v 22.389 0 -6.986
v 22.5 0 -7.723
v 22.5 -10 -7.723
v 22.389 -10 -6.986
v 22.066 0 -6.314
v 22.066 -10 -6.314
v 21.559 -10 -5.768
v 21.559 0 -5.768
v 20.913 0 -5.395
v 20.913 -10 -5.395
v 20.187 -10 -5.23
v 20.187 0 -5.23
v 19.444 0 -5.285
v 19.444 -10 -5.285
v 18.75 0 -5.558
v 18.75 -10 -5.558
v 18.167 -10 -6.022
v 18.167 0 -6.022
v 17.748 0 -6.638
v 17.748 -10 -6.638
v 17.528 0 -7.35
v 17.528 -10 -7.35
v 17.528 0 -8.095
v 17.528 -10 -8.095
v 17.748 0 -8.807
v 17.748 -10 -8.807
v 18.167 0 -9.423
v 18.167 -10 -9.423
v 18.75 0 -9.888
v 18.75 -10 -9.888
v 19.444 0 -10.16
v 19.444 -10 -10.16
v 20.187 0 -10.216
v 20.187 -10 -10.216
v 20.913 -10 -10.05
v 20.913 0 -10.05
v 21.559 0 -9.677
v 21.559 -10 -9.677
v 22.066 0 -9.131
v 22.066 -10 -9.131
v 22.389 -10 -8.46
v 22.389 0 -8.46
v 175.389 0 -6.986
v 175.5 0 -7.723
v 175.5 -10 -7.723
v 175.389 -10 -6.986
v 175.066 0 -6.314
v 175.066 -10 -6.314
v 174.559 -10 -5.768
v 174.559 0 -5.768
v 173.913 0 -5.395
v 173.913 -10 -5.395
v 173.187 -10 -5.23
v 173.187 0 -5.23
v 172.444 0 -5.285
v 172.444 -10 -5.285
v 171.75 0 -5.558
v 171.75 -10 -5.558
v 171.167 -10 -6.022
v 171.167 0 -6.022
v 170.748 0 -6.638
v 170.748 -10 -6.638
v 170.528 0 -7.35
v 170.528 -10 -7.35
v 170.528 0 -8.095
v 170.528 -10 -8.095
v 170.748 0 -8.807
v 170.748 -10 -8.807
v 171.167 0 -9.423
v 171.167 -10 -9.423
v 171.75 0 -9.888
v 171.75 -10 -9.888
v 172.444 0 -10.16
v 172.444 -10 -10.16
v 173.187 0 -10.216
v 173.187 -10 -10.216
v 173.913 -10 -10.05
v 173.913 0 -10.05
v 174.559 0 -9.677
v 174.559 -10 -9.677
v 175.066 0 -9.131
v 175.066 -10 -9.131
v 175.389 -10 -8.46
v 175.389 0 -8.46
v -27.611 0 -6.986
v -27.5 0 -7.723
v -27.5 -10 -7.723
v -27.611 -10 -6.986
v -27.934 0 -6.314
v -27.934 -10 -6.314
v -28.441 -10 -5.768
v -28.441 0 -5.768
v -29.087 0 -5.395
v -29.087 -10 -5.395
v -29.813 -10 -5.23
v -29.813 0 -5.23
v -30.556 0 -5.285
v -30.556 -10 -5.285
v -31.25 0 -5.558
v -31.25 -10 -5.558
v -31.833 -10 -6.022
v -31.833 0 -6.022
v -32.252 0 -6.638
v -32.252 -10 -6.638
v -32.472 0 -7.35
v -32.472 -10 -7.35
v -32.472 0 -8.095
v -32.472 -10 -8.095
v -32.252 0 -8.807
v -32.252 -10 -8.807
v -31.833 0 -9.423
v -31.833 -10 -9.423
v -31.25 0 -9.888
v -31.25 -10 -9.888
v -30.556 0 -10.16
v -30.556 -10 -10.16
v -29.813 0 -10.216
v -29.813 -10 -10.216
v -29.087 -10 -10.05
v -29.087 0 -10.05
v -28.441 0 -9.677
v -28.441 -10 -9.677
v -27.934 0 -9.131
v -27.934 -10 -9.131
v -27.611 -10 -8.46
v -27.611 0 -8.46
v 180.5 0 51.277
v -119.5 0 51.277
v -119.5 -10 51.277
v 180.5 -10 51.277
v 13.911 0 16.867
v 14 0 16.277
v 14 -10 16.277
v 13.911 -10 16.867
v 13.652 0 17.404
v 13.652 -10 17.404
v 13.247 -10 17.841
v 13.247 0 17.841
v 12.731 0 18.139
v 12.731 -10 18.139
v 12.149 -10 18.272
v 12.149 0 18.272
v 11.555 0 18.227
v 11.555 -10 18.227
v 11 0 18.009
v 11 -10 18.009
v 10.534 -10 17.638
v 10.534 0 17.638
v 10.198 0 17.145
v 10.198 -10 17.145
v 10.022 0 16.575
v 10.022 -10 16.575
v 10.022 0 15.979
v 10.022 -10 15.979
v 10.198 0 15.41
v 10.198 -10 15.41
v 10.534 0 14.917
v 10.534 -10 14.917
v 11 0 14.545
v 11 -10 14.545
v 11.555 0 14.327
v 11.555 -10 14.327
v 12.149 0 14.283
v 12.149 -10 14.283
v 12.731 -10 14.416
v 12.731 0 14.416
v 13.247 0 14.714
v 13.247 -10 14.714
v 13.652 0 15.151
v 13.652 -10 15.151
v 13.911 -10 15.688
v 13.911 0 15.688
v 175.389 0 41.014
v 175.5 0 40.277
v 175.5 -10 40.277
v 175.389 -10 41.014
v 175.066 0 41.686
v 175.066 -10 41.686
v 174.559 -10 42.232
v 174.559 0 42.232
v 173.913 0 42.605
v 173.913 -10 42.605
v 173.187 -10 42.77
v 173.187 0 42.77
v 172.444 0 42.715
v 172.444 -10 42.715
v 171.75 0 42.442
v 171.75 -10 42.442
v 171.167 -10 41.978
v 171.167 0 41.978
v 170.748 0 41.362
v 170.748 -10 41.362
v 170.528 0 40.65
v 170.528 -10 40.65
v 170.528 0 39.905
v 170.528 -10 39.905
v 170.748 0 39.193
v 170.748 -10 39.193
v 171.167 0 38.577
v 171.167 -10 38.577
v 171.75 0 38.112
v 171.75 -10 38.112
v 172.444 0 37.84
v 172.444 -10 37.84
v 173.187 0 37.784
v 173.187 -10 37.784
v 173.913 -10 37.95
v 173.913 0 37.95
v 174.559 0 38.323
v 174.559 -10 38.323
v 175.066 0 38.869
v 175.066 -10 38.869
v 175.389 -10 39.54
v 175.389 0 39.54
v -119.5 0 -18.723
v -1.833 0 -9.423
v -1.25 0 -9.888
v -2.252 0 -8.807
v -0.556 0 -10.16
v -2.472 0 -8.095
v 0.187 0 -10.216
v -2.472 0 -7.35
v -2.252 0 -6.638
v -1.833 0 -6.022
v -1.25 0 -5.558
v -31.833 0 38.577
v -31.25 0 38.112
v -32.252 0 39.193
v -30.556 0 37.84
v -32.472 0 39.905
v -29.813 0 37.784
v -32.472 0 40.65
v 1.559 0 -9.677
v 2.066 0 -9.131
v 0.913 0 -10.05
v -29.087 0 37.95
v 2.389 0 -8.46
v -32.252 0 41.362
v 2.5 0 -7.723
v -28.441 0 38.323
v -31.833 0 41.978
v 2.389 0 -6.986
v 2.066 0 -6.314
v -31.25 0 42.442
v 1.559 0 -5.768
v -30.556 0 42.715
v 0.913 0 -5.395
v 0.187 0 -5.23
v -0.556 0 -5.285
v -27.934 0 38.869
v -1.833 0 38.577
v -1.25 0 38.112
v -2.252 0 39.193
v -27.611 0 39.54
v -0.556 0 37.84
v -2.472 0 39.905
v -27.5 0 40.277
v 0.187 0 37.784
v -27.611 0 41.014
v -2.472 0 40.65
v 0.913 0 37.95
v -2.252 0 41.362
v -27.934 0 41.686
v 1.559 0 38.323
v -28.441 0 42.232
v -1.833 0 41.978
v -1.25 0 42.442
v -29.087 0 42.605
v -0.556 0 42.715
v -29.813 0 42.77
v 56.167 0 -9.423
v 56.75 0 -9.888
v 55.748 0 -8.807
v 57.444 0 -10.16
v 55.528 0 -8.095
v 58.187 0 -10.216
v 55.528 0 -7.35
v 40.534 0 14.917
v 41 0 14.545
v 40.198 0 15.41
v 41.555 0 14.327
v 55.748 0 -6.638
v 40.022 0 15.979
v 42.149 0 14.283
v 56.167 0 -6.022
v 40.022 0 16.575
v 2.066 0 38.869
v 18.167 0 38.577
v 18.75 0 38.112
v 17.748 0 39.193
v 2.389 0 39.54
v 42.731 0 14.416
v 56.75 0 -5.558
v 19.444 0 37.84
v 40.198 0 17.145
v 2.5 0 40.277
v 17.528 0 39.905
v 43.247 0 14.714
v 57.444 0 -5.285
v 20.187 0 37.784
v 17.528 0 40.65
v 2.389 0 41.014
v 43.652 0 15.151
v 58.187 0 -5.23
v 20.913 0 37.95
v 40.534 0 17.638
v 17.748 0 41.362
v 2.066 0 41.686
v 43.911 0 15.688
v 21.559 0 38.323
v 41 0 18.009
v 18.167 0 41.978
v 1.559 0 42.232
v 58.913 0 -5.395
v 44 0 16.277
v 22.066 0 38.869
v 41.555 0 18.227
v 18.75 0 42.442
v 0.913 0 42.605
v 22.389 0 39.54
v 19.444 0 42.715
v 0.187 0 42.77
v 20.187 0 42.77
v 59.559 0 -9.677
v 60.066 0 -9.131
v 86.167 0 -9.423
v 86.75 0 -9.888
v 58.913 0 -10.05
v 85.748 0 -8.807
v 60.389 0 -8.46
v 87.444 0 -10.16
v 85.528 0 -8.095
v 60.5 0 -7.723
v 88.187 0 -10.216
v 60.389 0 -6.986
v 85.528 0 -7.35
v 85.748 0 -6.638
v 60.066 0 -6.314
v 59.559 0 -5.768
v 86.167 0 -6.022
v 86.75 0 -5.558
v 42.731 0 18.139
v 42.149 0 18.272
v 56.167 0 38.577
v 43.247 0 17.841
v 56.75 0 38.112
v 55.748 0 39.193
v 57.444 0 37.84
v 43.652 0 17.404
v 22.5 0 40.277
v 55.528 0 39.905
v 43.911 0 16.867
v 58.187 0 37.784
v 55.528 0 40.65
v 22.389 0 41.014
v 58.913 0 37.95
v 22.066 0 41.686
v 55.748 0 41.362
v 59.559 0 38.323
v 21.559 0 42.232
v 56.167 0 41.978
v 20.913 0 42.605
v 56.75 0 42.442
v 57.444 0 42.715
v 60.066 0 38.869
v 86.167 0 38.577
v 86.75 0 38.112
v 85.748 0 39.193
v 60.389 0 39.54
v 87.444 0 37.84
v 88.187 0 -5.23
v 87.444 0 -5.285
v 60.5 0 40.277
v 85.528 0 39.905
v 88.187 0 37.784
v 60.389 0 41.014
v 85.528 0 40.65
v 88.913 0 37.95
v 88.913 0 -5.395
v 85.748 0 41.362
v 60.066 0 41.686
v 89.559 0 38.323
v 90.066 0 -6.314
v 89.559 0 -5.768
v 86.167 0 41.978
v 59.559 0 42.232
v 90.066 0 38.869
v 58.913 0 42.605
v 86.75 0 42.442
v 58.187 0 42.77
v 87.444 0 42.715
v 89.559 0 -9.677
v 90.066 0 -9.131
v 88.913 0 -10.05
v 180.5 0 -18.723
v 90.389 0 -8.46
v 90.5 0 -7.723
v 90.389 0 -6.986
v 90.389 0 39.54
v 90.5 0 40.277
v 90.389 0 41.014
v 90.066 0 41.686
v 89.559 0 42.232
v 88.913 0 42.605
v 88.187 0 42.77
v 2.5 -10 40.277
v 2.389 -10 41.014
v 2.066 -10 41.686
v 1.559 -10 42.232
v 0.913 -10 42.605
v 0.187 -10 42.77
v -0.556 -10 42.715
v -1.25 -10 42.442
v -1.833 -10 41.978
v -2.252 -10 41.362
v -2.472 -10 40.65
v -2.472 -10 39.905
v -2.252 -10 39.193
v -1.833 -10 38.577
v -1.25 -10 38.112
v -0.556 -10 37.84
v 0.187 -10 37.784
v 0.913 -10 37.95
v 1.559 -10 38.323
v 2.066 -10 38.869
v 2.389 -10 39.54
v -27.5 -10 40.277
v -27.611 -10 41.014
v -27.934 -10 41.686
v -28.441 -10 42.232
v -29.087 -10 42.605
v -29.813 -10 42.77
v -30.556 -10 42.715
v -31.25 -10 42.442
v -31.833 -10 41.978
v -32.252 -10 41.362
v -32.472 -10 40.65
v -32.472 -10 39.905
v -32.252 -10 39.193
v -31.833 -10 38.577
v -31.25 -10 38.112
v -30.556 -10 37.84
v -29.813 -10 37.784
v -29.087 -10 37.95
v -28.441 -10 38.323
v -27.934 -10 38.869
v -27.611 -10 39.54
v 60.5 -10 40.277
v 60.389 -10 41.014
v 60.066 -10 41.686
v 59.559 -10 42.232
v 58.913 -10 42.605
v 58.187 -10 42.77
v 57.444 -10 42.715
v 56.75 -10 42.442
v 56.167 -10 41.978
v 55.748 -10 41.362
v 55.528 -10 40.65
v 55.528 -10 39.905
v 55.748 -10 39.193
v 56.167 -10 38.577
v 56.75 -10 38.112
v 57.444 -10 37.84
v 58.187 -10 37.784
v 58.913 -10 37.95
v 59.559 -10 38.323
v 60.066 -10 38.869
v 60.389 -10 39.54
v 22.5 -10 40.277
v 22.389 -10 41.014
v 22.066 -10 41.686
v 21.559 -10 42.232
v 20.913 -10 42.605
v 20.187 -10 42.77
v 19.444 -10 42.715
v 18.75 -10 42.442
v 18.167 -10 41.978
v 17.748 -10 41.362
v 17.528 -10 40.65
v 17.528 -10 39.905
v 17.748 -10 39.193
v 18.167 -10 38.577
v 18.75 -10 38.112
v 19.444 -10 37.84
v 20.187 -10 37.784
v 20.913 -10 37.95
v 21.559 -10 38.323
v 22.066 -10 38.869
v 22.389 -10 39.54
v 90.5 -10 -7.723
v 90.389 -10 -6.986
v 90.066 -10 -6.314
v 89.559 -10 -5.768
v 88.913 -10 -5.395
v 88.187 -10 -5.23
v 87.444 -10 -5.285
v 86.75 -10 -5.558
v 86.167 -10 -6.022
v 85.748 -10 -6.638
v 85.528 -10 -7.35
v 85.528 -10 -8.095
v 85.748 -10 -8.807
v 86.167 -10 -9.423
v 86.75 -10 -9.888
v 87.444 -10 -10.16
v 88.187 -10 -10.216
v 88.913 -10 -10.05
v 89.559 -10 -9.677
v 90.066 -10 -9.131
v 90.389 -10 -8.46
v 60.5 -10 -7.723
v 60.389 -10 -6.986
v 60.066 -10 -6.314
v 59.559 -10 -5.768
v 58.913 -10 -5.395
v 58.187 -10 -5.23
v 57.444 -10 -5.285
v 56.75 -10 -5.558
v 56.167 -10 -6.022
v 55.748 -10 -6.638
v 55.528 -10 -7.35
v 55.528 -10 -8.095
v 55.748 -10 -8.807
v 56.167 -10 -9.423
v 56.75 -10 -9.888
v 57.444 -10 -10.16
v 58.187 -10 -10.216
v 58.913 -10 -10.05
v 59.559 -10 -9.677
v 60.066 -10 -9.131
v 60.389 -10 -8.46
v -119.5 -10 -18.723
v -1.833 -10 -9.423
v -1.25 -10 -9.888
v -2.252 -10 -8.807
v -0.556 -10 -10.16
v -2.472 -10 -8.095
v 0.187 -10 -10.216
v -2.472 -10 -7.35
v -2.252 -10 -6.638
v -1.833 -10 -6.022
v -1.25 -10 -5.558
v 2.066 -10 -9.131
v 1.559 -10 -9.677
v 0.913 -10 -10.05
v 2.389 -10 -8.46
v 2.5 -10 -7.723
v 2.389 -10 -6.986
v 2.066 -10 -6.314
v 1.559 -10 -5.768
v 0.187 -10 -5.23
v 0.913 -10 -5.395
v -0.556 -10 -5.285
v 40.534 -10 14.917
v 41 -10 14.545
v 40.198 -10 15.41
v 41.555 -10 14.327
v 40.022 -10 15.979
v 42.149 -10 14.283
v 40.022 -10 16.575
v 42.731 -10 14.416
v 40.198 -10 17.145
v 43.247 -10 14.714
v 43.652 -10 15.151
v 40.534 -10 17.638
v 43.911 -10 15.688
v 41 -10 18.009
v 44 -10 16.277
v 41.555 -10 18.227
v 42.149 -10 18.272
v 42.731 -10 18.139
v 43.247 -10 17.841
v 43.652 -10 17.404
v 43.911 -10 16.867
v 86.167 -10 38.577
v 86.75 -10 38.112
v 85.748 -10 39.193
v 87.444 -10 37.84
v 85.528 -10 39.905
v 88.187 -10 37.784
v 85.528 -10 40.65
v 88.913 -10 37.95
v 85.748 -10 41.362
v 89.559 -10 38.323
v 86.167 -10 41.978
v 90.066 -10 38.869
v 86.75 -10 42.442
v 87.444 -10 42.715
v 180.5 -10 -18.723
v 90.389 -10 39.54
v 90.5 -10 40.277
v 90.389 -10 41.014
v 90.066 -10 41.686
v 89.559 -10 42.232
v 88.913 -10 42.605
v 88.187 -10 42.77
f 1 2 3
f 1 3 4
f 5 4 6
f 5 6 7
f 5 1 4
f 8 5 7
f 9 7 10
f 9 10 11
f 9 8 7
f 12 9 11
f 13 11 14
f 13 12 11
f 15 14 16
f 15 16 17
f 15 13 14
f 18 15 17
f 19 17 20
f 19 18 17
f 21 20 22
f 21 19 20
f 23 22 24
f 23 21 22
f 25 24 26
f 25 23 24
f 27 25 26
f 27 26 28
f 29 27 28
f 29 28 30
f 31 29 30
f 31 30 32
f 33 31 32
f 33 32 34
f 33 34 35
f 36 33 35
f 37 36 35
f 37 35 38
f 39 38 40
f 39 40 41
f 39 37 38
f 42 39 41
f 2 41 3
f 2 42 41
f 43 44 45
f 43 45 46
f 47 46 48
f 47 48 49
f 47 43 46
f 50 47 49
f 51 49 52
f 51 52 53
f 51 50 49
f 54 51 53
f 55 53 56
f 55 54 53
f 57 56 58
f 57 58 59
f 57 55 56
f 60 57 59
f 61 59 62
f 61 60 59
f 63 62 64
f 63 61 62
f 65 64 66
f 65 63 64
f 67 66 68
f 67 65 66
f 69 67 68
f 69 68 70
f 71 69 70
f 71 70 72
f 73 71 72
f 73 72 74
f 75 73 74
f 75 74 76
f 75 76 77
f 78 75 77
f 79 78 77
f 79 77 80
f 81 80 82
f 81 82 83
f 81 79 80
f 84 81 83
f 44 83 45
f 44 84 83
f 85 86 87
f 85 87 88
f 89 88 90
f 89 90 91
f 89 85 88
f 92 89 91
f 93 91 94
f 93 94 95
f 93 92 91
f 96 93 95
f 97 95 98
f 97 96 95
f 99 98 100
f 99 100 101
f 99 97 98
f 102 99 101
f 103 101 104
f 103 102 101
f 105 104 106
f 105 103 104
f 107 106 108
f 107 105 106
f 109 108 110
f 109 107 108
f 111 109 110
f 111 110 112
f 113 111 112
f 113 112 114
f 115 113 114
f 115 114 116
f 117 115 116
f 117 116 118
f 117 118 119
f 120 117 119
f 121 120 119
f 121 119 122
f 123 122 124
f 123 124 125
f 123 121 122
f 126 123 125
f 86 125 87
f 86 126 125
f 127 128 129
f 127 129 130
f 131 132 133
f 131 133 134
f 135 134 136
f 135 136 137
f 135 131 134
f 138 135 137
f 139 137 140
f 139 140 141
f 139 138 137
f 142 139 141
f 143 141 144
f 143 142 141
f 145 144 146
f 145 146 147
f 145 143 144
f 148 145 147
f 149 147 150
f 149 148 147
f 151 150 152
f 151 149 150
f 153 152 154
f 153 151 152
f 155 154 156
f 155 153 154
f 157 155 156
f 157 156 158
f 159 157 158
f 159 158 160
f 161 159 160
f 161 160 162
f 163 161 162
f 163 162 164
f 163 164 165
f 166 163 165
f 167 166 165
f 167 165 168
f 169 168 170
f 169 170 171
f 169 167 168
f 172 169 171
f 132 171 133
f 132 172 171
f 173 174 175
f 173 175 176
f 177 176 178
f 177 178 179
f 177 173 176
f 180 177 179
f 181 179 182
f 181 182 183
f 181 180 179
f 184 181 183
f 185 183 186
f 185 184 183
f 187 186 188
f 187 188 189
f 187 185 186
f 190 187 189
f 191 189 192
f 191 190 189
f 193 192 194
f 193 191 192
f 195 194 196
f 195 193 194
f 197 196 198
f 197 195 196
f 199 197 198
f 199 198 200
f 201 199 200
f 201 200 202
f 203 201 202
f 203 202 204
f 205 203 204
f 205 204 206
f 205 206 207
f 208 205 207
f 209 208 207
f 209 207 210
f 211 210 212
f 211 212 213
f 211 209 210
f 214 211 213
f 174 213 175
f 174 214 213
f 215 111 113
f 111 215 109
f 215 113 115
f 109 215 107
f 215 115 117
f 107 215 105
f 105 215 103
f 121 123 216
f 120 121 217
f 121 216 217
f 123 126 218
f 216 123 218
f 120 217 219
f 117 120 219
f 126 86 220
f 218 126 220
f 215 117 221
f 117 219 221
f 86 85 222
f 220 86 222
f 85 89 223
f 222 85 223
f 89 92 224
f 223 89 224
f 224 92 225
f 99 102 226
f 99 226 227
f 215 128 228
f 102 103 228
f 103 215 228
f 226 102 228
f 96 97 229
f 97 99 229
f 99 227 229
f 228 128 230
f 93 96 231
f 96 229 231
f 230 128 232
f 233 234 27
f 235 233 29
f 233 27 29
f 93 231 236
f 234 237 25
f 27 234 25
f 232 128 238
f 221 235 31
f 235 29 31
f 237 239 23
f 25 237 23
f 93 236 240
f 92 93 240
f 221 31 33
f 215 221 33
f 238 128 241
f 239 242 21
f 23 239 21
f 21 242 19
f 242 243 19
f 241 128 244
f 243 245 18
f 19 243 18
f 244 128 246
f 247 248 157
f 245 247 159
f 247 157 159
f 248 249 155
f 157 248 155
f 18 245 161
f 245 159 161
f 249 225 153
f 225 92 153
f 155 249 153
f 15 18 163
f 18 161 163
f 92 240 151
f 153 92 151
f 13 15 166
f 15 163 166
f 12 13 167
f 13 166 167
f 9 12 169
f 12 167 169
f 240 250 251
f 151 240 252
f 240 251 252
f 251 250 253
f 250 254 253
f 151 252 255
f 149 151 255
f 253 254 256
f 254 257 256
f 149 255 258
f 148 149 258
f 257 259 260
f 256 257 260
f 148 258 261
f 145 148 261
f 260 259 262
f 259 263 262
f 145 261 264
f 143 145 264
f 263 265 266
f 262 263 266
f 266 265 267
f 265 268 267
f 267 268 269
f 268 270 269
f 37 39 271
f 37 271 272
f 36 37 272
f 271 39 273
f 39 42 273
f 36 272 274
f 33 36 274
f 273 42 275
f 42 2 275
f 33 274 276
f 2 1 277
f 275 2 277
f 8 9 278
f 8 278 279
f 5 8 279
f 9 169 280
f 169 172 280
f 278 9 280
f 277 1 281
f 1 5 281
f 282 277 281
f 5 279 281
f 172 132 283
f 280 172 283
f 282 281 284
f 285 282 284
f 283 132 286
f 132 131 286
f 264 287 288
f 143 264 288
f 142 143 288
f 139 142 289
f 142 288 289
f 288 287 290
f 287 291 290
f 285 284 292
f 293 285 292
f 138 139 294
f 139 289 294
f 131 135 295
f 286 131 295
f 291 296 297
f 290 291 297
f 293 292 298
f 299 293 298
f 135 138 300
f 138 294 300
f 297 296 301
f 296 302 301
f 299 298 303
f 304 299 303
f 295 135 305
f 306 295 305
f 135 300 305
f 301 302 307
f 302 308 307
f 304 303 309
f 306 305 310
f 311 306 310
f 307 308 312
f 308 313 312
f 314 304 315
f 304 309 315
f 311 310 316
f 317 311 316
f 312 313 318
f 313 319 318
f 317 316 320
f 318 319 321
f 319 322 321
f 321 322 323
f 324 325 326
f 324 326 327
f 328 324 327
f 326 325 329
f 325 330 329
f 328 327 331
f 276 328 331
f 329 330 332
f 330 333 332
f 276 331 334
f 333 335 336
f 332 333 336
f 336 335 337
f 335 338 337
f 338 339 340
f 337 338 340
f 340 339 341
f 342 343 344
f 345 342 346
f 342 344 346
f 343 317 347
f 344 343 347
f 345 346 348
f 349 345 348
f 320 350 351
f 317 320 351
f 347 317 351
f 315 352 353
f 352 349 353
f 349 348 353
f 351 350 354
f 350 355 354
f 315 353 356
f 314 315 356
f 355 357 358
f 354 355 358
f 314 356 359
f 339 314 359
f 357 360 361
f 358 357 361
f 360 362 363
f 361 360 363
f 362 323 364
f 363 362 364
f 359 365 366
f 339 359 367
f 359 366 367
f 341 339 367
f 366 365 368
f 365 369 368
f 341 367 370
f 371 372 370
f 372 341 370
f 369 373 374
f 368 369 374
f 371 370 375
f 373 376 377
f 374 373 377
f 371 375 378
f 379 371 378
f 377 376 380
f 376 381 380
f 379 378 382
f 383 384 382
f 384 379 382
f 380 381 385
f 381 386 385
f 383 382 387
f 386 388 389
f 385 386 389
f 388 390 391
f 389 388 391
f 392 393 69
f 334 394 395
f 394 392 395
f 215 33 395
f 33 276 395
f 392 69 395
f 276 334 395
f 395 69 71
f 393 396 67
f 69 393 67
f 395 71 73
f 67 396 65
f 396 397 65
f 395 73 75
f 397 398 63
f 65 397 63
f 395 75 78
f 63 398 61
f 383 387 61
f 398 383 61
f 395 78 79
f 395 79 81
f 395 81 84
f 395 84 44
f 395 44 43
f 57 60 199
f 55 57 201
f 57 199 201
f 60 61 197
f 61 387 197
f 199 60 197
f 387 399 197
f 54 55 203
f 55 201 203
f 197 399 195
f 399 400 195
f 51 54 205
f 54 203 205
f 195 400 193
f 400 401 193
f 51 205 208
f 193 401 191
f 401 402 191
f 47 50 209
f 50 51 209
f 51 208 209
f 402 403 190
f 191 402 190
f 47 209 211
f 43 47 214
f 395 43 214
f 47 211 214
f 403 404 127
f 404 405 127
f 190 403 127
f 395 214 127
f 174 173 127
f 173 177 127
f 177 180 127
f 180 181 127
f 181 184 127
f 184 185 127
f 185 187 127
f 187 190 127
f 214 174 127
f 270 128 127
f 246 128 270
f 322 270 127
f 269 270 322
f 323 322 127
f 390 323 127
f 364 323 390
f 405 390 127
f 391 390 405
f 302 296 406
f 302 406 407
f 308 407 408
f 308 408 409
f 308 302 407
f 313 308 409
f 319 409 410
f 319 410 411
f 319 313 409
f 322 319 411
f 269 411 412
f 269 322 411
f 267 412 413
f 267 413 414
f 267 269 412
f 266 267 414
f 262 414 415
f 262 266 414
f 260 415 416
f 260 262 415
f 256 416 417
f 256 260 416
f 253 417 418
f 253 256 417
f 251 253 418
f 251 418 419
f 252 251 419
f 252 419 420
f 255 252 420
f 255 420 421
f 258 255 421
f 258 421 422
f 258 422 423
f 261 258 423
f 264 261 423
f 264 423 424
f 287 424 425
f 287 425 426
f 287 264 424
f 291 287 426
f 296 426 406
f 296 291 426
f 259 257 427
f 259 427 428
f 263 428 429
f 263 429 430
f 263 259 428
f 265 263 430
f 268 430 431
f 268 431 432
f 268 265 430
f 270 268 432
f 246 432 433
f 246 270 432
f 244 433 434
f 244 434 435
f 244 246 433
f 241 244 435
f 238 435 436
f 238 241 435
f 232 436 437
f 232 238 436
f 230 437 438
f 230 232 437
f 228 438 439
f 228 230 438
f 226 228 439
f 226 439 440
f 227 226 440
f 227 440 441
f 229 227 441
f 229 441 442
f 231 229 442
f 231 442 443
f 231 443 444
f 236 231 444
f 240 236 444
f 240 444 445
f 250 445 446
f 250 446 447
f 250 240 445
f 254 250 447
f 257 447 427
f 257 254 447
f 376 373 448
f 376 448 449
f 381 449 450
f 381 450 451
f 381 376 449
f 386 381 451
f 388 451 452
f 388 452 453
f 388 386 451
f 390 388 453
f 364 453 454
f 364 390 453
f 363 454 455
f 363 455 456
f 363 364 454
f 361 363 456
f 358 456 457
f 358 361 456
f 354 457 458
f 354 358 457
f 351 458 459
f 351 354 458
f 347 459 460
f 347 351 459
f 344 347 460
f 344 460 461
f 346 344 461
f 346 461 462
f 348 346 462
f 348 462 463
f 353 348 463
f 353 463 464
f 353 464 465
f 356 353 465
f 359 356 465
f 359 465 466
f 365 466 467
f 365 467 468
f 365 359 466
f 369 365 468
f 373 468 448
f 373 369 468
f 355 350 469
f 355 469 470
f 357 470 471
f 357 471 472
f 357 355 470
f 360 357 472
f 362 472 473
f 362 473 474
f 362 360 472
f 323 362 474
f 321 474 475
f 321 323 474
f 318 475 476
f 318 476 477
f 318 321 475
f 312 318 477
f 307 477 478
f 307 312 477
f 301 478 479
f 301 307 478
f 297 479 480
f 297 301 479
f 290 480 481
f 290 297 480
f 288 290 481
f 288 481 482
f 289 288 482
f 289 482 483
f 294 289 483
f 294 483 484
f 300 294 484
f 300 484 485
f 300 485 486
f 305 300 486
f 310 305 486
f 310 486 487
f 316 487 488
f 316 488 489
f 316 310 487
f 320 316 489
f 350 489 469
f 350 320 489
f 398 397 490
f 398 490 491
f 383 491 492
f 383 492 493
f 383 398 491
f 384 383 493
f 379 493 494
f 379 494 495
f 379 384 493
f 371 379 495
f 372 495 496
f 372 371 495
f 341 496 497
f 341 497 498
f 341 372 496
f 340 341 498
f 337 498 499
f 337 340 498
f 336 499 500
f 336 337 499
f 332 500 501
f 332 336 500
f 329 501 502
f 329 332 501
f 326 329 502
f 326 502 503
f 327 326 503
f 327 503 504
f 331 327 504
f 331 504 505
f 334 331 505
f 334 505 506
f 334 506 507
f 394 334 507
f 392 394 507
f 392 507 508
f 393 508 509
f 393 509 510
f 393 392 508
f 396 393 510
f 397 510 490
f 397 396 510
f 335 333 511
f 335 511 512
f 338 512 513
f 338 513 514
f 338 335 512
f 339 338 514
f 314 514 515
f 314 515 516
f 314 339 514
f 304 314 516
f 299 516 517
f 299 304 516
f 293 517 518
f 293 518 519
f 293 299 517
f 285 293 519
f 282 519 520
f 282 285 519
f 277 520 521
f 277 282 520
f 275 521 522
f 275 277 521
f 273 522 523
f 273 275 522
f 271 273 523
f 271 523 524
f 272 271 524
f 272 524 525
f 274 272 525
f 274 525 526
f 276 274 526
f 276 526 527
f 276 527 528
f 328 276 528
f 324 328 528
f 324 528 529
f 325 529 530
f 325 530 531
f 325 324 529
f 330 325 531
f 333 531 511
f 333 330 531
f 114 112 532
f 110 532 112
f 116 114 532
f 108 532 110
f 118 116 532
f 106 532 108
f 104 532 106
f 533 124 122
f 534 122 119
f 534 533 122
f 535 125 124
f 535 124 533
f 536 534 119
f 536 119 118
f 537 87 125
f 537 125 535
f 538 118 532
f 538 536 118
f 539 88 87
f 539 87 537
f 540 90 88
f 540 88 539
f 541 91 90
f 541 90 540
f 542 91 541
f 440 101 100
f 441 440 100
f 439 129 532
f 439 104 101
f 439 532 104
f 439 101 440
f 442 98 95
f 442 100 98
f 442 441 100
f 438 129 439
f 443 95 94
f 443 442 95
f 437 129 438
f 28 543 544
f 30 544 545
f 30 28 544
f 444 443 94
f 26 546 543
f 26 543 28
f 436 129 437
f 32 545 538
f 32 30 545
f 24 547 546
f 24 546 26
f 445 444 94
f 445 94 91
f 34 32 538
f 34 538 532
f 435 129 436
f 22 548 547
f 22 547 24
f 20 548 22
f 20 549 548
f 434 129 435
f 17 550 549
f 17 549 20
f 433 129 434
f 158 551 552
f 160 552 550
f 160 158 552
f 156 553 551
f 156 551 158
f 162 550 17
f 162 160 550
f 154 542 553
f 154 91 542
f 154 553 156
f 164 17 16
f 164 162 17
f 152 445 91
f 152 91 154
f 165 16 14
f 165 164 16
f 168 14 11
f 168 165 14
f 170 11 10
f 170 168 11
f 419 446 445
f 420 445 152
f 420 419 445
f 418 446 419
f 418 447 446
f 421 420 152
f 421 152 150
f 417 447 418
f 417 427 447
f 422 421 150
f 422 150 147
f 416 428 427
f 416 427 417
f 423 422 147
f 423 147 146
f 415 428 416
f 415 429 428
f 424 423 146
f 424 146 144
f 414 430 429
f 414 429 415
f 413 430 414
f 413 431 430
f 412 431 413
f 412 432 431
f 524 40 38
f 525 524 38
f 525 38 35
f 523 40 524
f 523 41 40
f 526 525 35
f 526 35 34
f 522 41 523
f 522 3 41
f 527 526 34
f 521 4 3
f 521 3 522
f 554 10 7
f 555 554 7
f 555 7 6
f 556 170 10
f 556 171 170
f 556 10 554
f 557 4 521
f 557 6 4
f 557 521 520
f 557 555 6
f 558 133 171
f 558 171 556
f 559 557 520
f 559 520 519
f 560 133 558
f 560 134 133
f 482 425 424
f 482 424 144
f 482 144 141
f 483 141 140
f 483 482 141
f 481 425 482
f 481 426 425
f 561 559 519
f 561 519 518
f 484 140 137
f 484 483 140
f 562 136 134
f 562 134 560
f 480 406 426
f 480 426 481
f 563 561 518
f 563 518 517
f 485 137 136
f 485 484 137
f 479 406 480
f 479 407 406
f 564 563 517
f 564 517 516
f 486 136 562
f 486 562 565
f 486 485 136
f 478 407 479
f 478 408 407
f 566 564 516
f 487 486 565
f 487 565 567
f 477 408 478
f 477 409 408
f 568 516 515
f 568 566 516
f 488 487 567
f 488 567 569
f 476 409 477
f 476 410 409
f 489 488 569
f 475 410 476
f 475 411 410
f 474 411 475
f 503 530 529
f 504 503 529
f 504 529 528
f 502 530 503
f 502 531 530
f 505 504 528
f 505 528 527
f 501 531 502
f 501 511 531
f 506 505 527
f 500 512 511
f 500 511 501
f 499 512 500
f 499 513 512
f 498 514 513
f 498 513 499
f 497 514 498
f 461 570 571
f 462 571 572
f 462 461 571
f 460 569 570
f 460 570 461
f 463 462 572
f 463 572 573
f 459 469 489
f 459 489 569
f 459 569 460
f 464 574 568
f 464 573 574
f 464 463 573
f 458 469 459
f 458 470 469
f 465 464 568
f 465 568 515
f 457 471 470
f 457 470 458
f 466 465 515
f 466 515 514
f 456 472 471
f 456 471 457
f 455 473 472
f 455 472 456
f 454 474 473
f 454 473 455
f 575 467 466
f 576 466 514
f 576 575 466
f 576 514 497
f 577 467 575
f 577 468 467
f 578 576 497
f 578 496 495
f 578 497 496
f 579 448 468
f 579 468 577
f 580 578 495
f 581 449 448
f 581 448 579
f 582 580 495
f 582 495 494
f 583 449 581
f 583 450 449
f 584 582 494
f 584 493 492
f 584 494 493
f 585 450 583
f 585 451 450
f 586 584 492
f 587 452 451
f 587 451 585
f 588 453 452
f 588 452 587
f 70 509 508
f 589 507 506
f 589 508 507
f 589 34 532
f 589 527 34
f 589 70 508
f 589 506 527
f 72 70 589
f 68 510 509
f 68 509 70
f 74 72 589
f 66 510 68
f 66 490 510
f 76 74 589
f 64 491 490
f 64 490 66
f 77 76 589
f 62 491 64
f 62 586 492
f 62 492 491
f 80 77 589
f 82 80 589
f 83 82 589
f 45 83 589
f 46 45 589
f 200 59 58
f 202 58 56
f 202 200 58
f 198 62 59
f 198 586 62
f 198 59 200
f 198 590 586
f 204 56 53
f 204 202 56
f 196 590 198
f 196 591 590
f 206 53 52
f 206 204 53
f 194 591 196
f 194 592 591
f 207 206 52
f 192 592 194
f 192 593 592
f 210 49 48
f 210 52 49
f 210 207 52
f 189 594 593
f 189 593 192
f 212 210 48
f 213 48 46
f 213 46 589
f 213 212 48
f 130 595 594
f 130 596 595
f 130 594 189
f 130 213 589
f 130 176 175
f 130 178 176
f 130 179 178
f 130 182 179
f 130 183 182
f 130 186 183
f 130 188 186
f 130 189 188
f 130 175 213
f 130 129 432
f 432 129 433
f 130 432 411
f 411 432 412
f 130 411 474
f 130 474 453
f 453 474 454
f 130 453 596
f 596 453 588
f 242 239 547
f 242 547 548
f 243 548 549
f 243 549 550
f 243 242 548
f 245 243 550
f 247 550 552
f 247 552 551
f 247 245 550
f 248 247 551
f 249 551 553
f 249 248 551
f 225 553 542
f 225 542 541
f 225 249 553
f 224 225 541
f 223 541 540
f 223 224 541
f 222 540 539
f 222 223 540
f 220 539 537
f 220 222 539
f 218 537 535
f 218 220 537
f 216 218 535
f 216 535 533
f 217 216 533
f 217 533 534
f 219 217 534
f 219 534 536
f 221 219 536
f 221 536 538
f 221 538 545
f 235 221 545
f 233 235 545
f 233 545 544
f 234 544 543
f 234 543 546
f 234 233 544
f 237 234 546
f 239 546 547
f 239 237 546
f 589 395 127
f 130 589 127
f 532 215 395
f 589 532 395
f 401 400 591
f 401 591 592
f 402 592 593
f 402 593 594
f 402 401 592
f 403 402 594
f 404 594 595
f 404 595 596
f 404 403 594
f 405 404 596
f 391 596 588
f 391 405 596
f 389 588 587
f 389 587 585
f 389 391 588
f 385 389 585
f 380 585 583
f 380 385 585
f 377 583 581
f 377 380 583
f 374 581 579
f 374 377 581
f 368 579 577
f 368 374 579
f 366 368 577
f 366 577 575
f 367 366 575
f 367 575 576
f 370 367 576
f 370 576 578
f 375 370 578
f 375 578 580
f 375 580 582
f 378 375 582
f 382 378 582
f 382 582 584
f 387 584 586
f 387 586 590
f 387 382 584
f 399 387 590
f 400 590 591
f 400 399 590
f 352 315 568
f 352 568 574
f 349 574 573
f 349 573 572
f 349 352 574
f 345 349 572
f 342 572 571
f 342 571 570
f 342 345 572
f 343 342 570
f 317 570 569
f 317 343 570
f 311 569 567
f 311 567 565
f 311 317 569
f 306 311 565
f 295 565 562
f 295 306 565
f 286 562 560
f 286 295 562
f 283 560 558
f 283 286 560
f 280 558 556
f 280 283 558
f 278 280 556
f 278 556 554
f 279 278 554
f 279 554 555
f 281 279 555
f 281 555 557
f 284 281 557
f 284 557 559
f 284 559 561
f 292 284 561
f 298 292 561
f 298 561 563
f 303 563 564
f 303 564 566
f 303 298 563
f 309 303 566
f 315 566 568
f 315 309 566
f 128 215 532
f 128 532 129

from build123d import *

# Parameters (mm, degrees)
F0_W     = 300
F0_H     = 70
F0_R     = 2.5
F0_R_2   = 2
F1_DEPTH = 10


with BuildPart() as f1:
    # F0 (on Front) → F1 (new body)
    with BuildSketch(Plane.XZ):
        with Locations((30.5, 16.277353)):
            Rectangle(F0_W, F0_H)
        with Locations((-30, -7.722647)):
            Circle(F0_R, mode=Mode.SUBTRACT)
        with Locations((0, -7.722647)):
            Circle(F0_R, mode=Mode.SUBTRACT)
        with Locations((20, -7.722647)):
            Circle(F0_R, mode=Mode.SUBTRACT)
        with Locations((58, -7.722647)):
            Circle(F0_R, mode=Mode.SUBTRACT)
        with Locations((88, -7.722647)):
            Circle(F0_R, mode=Mode.SUBTRACT)
        with Locations((173, -7.722647)):
            Circle(F0_R, mode=Mode.SUBTRACT)
        with Locations((12, 16.277353)):
            Circle(F0_R_2, mode=Mode.SUBTRACT)
        with Locations((-30, 40.277353)):
            Circle(F0_R, mode=Mode.SUBTRACT)
        with Locations((0, 40.277353)):
            Circle(F0_R, mode=Mode.SUBTRACT)
        with Locations((20, 40.277353)):
            Circle(F0_R, mode=Mode.SUBTRACT)
        with Locations((42, 16.277353)):
            Circle(F0_R_2, mode=Mode.SUBTRACT)
        with Locations((58, 40.277353)):
            Circle(F0_R, mode=Mode.SUBTRACT)
        with Locations((88, 40.277353)):
            Circle(F0_R, mode=Mode.SUBTRACT)
        with Locations((173, 40.277353)):
            Circle(F0_R, mode=Mode.SUBTRACT)
    extrude(amount=F1_DEPTH)


solid = f1.part
